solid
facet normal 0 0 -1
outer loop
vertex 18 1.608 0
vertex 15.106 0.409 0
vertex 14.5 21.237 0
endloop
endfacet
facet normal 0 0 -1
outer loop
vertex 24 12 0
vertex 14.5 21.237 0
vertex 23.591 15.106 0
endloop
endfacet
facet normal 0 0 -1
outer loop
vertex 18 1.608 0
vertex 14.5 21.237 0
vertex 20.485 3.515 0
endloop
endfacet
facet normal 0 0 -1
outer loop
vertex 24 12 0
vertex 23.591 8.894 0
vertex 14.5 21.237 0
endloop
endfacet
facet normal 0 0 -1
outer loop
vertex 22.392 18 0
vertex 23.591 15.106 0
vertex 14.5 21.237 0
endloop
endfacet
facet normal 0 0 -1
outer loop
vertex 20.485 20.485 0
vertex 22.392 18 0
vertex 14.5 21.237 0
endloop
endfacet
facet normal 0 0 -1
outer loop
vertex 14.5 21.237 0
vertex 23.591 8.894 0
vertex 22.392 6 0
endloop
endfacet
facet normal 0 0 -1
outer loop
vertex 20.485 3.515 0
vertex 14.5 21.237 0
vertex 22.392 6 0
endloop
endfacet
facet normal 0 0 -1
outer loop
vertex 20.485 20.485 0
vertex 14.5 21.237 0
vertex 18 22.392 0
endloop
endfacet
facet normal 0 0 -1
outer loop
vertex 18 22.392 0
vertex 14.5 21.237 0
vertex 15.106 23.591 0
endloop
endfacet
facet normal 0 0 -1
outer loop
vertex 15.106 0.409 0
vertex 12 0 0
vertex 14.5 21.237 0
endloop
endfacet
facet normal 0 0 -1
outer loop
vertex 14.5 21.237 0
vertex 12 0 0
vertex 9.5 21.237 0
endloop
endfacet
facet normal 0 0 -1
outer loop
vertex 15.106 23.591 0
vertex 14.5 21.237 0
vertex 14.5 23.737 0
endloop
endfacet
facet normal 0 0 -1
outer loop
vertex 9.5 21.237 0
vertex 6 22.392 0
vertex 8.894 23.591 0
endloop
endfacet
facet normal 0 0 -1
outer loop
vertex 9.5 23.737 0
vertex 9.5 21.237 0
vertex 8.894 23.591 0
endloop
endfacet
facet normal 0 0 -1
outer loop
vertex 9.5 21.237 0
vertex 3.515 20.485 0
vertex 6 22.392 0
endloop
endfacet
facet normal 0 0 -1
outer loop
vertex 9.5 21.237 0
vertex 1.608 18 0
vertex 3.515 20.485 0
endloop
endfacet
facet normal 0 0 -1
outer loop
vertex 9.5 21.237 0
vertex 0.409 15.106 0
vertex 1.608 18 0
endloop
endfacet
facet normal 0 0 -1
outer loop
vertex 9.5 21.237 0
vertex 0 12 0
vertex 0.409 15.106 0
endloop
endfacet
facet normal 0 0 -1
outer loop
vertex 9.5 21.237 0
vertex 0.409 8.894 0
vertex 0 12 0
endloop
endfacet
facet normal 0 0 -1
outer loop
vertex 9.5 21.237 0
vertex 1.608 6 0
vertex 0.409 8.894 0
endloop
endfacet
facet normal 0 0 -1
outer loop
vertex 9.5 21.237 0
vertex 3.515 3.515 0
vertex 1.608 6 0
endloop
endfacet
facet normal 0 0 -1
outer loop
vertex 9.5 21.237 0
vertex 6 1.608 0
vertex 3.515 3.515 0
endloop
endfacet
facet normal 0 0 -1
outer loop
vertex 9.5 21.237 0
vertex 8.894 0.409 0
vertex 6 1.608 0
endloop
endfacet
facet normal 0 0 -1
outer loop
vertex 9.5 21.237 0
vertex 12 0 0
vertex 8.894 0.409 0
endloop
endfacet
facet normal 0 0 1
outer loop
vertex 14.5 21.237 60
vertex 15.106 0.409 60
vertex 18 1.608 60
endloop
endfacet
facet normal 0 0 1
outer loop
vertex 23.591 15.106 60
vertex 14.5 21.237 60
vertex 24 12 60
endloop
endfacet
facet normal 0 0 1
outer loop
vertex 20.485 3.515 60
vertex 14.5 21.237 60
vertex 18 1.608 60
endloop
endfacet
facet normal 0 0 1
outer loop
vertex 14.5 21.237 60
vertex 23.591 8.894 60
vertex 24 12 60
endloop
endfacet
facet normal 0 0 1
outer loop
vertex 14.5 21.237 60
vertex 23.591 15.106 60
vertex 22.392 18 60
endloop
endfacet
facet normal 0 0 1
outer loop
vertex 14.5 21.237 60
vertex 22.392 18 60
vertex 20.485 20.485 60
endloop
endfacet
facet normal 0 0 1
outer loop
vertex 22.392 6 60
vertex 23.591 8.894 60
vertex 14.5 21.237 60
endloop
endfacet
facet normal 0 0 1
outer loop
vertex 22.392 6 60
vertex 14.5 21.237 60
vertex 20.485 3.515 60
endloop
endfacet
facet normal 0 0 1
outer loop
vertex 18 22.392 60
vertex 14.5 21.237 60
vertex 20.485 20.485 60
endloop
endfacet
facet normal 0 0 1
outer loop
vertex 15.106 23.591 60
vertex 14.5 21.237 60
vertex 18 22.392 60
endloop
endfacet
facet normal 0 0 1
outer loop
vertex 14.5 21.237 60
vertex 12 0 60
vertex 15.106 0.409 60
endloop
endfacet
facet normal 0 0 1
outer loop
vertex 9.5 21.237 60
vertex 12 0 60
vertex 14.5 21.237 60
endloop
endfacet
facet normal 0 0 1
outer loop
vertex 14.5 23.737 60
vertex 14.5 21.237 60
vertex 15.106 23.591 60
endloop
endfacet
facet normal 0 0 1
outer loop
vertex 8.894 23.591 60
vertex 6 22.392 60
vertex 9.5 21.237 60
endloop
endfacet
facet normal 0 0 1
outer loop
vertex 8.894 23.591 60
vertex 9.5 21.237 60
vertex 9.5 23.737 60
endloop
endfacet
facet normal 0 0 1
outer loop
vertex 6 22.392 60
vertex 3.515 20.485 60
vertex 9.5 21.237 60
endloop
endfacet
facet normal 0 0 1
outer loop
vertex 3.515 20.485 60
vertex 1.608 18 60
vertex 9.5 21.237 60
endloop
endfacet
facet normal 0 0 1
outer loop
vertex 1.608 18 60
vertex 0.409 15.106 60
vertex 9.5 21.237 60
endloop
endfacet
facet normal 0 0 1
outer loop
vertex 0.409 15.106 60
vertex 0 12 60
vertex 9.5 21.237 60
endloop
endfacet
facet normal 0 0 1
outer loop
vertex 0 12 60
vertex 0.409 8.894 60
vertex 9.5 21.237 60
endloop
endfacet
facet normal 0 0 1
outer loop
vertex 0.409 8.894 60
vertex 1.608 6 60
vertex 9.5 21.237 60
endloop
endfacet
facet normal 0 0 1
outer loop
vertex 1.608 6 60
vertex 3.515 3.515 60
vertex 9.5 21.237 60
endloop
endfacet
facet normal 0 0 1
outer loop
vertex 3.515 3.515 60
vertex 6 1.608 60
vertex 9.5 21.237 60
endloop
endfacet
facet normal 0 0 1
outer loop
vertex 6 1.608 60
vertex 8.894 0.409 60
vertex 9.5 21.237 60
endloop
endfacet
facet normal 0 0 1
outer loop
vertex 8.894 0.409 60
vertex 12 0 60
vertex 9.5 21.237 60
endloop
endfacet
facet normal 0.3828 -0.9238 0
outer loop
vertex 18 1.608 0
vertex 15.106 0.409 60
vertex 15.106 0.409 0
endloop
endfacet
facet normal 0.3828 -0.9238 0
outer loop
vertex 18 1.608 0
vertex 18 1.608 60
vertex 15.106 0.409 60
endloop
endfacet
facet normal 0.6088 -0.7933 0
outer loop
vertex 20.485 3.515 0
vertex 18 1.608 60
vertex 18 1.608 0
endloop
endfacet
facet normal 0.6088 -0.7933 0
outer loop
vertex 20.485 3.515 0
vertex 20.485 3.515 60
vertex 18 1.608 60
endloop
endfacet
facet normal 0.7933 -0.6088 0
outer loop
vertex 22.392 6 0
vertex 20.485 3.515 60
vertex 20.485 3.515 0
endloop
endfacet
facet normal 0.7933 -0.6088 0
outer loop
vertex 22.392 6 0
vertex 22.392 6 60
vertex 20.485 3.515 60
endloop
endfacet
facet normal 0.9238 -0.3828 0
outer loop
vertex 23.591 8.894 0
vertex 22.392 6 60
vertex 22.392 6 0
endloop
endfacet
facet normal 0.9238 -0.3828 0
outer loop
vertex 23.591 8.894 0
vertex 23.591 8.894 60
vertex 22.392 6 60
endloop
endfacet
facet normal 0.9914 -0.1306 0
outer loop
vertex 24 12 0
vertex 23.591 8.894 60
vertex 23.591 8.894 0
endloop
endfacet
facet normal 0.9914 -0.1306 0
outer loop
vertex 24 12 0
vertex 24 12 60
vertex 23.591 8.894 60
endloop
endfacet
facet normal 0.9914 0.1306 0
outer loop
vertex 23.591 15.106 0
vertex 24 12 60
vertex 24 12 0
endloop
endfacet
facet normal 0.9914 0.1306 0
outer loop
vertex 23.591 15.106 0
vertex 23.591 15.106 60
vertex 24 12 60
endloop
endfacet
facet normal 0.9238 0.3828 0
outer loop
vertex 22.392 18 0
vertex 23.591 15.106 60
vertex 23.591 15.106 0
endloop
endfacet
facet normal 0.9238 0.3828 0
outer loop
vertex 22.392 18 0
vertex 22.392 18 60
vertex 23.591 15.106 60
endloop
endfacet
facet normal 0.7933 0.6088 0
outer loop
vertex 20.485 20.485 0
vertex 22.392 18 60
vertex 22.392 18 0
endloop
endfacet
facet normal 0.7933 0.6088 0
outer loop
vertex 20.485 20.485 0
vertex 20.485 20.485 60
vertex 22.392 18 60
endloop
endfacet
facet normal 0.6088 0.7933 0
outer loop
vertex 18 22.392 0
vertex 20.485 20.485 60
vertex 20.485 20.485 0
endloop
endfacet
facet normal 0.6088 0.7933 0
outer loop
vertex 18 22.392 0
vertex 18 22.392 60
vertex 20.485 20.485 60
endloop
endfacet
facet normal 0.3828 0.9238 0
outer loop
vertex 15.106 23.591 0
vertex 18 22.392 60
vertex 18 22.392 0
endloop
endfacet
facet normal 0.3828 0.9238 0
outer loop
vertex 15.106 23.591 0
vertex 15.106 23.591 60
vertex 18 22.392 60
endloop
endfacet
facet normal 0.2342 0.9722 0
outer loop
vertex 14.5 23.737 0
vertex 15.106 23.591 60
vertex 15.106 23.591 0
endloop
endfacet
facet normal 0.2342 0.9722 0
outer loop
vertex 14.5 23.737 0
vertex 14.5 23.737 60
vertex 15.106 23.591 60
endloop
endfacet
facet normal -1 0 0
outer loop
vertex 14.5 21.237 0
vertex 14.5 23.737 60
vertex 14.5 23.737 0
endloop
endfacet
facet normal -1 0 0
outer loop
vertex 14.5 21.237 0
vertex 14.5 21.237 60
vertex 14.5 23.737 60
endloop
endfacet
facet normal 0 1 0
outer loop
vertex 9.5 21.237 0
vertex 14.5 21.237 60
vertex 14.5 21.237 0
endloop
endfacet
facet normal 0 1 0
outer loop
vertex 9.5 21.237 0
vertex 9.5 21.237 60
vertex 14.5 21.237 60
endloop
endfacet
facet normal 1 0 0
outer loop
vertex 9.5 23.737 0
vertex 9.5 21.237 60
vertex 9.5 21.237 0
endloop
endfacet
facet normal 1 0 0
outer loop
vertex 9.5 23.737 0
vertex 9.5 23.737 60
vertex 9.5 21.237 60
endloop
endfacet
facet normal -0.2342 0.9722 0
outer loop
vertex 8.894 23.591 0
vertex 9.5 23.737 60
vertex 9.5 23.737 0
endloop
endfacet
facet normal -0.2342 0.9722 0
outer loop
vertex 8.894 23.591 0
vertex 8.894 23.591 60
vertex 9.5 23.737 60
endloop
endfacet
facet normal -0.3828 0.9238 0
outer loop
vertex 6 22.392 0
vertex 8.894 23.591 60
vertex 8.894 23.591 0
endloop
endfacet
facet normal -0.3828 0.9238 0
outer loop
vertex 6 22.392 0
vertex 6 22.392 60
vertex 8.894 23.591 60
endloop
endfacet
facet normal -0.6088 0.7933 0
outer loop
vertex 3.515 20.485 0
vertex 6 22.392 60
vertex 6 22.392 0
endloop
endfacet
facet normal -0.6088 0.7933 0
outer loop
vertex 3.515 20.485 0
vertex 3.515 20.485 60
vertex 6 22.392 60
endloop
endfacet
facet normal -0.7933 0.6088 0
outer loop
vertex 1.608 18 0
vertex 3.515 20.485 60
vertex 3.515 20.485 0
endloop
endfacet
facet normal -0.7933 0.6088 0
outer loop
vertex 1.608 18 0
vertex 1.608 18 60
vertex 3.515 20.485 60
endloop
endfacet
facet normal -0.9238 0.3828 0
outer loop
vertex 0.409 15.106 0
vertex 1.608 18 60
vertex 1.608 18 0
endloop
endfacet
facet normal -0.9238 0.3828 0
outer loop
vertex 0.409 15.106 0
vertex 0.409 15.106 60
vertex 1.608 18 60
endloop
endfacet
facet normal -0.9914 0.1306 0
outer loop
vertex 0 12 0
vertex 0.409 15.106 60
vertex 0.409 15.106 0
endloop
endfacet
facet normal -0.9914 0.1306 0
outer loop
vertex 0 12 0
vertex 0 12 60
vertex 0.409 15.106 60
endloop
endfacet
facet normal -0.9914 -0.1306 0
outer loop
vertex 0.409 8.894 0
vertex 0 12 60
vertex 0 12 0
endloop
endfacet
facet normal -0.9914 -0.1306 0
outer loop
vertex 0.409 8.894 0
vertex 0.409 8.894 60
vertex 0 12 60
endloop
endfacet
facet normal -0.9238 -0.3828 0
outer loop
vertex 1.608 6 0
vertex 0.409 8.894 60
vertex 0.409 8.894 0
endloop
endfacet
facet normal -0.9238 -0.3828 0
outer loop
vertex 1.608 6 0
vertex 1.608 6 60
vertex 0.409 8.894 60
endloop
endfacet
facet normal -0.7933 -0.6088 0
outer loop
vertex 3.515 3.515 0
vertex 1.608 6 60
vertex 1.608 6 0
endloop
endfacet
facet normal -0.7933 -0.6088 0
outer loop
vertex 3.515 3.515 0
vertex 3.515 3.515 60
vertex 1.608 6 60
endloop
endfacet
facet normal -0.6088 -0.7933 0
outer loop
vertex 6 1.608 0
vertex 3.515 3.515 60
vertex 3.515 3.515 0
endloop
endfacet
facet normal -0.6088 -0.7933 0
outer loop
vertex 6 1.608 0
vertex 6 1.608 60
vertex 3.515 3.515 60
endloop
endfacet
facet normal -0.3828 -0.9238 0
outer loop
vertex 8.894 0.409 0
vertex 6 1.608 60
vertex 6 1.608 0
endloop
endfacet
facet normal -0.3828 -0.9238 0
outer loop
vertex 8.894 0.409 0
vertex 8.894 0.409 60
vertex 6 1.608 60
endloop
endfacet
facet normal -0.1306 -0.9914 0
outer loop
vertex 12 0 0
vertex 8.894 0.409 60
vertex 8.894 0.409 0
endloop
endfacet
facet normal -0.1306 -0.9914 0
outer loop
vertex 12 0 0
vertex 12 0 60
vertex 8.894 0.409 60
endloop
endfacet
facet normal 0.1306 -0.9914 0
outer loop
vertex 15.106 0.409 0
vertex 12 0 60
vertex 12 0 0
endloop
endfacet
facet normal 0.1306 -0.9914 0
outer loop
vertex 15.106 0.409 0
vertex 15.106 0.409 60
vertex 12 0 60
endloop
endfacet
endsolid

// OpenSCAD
$fn = 32;

// ----------------------------------------------------------------------
// Keyway shaft: d24 shaft, key 5 x 2.5 mm
// ----------------------------------------------------------------------

// --- parameters (mm) ---
shaft_r = 12;             // shaft radius
key_w = 5;                // keyway width
key_d = 2.5;              // keyway depth below the surface line
plate_t = 60;             // shaft length, Z (extrusion height)

shaft_d = 2 * shaft_r;  // shaft diameter
circle_step = 15;  // polygon sampling step, degrees

profile = [[8.894, 23.591], [6, 22.392], [3.515, 20.485], [1.608, 18], [0.409, 15.106], [0, 12], [0.409, 8.894], [1.608, 6], [3.515, 3.515], [6, 1.608], [8.894, 0.409], [12, 0], [15.106, 0.409], [18, 1.608], [20.485, 3.515], [22.392, 6], [23.591, 8.894], [24, 12], [23.591, 15.106], [22.392, 18], [20.485, 20.485], [18, 22.392], [15.106, 23.591], [14.5, 23.737], [14.5, 21.237], [9.5, 21.237], [9.5, 23.737]];  // primary outline, 27 points, counter clockwise

// --- the one profile operation ---
linear_extrude(height = plate_t) polygon(points = profile);
